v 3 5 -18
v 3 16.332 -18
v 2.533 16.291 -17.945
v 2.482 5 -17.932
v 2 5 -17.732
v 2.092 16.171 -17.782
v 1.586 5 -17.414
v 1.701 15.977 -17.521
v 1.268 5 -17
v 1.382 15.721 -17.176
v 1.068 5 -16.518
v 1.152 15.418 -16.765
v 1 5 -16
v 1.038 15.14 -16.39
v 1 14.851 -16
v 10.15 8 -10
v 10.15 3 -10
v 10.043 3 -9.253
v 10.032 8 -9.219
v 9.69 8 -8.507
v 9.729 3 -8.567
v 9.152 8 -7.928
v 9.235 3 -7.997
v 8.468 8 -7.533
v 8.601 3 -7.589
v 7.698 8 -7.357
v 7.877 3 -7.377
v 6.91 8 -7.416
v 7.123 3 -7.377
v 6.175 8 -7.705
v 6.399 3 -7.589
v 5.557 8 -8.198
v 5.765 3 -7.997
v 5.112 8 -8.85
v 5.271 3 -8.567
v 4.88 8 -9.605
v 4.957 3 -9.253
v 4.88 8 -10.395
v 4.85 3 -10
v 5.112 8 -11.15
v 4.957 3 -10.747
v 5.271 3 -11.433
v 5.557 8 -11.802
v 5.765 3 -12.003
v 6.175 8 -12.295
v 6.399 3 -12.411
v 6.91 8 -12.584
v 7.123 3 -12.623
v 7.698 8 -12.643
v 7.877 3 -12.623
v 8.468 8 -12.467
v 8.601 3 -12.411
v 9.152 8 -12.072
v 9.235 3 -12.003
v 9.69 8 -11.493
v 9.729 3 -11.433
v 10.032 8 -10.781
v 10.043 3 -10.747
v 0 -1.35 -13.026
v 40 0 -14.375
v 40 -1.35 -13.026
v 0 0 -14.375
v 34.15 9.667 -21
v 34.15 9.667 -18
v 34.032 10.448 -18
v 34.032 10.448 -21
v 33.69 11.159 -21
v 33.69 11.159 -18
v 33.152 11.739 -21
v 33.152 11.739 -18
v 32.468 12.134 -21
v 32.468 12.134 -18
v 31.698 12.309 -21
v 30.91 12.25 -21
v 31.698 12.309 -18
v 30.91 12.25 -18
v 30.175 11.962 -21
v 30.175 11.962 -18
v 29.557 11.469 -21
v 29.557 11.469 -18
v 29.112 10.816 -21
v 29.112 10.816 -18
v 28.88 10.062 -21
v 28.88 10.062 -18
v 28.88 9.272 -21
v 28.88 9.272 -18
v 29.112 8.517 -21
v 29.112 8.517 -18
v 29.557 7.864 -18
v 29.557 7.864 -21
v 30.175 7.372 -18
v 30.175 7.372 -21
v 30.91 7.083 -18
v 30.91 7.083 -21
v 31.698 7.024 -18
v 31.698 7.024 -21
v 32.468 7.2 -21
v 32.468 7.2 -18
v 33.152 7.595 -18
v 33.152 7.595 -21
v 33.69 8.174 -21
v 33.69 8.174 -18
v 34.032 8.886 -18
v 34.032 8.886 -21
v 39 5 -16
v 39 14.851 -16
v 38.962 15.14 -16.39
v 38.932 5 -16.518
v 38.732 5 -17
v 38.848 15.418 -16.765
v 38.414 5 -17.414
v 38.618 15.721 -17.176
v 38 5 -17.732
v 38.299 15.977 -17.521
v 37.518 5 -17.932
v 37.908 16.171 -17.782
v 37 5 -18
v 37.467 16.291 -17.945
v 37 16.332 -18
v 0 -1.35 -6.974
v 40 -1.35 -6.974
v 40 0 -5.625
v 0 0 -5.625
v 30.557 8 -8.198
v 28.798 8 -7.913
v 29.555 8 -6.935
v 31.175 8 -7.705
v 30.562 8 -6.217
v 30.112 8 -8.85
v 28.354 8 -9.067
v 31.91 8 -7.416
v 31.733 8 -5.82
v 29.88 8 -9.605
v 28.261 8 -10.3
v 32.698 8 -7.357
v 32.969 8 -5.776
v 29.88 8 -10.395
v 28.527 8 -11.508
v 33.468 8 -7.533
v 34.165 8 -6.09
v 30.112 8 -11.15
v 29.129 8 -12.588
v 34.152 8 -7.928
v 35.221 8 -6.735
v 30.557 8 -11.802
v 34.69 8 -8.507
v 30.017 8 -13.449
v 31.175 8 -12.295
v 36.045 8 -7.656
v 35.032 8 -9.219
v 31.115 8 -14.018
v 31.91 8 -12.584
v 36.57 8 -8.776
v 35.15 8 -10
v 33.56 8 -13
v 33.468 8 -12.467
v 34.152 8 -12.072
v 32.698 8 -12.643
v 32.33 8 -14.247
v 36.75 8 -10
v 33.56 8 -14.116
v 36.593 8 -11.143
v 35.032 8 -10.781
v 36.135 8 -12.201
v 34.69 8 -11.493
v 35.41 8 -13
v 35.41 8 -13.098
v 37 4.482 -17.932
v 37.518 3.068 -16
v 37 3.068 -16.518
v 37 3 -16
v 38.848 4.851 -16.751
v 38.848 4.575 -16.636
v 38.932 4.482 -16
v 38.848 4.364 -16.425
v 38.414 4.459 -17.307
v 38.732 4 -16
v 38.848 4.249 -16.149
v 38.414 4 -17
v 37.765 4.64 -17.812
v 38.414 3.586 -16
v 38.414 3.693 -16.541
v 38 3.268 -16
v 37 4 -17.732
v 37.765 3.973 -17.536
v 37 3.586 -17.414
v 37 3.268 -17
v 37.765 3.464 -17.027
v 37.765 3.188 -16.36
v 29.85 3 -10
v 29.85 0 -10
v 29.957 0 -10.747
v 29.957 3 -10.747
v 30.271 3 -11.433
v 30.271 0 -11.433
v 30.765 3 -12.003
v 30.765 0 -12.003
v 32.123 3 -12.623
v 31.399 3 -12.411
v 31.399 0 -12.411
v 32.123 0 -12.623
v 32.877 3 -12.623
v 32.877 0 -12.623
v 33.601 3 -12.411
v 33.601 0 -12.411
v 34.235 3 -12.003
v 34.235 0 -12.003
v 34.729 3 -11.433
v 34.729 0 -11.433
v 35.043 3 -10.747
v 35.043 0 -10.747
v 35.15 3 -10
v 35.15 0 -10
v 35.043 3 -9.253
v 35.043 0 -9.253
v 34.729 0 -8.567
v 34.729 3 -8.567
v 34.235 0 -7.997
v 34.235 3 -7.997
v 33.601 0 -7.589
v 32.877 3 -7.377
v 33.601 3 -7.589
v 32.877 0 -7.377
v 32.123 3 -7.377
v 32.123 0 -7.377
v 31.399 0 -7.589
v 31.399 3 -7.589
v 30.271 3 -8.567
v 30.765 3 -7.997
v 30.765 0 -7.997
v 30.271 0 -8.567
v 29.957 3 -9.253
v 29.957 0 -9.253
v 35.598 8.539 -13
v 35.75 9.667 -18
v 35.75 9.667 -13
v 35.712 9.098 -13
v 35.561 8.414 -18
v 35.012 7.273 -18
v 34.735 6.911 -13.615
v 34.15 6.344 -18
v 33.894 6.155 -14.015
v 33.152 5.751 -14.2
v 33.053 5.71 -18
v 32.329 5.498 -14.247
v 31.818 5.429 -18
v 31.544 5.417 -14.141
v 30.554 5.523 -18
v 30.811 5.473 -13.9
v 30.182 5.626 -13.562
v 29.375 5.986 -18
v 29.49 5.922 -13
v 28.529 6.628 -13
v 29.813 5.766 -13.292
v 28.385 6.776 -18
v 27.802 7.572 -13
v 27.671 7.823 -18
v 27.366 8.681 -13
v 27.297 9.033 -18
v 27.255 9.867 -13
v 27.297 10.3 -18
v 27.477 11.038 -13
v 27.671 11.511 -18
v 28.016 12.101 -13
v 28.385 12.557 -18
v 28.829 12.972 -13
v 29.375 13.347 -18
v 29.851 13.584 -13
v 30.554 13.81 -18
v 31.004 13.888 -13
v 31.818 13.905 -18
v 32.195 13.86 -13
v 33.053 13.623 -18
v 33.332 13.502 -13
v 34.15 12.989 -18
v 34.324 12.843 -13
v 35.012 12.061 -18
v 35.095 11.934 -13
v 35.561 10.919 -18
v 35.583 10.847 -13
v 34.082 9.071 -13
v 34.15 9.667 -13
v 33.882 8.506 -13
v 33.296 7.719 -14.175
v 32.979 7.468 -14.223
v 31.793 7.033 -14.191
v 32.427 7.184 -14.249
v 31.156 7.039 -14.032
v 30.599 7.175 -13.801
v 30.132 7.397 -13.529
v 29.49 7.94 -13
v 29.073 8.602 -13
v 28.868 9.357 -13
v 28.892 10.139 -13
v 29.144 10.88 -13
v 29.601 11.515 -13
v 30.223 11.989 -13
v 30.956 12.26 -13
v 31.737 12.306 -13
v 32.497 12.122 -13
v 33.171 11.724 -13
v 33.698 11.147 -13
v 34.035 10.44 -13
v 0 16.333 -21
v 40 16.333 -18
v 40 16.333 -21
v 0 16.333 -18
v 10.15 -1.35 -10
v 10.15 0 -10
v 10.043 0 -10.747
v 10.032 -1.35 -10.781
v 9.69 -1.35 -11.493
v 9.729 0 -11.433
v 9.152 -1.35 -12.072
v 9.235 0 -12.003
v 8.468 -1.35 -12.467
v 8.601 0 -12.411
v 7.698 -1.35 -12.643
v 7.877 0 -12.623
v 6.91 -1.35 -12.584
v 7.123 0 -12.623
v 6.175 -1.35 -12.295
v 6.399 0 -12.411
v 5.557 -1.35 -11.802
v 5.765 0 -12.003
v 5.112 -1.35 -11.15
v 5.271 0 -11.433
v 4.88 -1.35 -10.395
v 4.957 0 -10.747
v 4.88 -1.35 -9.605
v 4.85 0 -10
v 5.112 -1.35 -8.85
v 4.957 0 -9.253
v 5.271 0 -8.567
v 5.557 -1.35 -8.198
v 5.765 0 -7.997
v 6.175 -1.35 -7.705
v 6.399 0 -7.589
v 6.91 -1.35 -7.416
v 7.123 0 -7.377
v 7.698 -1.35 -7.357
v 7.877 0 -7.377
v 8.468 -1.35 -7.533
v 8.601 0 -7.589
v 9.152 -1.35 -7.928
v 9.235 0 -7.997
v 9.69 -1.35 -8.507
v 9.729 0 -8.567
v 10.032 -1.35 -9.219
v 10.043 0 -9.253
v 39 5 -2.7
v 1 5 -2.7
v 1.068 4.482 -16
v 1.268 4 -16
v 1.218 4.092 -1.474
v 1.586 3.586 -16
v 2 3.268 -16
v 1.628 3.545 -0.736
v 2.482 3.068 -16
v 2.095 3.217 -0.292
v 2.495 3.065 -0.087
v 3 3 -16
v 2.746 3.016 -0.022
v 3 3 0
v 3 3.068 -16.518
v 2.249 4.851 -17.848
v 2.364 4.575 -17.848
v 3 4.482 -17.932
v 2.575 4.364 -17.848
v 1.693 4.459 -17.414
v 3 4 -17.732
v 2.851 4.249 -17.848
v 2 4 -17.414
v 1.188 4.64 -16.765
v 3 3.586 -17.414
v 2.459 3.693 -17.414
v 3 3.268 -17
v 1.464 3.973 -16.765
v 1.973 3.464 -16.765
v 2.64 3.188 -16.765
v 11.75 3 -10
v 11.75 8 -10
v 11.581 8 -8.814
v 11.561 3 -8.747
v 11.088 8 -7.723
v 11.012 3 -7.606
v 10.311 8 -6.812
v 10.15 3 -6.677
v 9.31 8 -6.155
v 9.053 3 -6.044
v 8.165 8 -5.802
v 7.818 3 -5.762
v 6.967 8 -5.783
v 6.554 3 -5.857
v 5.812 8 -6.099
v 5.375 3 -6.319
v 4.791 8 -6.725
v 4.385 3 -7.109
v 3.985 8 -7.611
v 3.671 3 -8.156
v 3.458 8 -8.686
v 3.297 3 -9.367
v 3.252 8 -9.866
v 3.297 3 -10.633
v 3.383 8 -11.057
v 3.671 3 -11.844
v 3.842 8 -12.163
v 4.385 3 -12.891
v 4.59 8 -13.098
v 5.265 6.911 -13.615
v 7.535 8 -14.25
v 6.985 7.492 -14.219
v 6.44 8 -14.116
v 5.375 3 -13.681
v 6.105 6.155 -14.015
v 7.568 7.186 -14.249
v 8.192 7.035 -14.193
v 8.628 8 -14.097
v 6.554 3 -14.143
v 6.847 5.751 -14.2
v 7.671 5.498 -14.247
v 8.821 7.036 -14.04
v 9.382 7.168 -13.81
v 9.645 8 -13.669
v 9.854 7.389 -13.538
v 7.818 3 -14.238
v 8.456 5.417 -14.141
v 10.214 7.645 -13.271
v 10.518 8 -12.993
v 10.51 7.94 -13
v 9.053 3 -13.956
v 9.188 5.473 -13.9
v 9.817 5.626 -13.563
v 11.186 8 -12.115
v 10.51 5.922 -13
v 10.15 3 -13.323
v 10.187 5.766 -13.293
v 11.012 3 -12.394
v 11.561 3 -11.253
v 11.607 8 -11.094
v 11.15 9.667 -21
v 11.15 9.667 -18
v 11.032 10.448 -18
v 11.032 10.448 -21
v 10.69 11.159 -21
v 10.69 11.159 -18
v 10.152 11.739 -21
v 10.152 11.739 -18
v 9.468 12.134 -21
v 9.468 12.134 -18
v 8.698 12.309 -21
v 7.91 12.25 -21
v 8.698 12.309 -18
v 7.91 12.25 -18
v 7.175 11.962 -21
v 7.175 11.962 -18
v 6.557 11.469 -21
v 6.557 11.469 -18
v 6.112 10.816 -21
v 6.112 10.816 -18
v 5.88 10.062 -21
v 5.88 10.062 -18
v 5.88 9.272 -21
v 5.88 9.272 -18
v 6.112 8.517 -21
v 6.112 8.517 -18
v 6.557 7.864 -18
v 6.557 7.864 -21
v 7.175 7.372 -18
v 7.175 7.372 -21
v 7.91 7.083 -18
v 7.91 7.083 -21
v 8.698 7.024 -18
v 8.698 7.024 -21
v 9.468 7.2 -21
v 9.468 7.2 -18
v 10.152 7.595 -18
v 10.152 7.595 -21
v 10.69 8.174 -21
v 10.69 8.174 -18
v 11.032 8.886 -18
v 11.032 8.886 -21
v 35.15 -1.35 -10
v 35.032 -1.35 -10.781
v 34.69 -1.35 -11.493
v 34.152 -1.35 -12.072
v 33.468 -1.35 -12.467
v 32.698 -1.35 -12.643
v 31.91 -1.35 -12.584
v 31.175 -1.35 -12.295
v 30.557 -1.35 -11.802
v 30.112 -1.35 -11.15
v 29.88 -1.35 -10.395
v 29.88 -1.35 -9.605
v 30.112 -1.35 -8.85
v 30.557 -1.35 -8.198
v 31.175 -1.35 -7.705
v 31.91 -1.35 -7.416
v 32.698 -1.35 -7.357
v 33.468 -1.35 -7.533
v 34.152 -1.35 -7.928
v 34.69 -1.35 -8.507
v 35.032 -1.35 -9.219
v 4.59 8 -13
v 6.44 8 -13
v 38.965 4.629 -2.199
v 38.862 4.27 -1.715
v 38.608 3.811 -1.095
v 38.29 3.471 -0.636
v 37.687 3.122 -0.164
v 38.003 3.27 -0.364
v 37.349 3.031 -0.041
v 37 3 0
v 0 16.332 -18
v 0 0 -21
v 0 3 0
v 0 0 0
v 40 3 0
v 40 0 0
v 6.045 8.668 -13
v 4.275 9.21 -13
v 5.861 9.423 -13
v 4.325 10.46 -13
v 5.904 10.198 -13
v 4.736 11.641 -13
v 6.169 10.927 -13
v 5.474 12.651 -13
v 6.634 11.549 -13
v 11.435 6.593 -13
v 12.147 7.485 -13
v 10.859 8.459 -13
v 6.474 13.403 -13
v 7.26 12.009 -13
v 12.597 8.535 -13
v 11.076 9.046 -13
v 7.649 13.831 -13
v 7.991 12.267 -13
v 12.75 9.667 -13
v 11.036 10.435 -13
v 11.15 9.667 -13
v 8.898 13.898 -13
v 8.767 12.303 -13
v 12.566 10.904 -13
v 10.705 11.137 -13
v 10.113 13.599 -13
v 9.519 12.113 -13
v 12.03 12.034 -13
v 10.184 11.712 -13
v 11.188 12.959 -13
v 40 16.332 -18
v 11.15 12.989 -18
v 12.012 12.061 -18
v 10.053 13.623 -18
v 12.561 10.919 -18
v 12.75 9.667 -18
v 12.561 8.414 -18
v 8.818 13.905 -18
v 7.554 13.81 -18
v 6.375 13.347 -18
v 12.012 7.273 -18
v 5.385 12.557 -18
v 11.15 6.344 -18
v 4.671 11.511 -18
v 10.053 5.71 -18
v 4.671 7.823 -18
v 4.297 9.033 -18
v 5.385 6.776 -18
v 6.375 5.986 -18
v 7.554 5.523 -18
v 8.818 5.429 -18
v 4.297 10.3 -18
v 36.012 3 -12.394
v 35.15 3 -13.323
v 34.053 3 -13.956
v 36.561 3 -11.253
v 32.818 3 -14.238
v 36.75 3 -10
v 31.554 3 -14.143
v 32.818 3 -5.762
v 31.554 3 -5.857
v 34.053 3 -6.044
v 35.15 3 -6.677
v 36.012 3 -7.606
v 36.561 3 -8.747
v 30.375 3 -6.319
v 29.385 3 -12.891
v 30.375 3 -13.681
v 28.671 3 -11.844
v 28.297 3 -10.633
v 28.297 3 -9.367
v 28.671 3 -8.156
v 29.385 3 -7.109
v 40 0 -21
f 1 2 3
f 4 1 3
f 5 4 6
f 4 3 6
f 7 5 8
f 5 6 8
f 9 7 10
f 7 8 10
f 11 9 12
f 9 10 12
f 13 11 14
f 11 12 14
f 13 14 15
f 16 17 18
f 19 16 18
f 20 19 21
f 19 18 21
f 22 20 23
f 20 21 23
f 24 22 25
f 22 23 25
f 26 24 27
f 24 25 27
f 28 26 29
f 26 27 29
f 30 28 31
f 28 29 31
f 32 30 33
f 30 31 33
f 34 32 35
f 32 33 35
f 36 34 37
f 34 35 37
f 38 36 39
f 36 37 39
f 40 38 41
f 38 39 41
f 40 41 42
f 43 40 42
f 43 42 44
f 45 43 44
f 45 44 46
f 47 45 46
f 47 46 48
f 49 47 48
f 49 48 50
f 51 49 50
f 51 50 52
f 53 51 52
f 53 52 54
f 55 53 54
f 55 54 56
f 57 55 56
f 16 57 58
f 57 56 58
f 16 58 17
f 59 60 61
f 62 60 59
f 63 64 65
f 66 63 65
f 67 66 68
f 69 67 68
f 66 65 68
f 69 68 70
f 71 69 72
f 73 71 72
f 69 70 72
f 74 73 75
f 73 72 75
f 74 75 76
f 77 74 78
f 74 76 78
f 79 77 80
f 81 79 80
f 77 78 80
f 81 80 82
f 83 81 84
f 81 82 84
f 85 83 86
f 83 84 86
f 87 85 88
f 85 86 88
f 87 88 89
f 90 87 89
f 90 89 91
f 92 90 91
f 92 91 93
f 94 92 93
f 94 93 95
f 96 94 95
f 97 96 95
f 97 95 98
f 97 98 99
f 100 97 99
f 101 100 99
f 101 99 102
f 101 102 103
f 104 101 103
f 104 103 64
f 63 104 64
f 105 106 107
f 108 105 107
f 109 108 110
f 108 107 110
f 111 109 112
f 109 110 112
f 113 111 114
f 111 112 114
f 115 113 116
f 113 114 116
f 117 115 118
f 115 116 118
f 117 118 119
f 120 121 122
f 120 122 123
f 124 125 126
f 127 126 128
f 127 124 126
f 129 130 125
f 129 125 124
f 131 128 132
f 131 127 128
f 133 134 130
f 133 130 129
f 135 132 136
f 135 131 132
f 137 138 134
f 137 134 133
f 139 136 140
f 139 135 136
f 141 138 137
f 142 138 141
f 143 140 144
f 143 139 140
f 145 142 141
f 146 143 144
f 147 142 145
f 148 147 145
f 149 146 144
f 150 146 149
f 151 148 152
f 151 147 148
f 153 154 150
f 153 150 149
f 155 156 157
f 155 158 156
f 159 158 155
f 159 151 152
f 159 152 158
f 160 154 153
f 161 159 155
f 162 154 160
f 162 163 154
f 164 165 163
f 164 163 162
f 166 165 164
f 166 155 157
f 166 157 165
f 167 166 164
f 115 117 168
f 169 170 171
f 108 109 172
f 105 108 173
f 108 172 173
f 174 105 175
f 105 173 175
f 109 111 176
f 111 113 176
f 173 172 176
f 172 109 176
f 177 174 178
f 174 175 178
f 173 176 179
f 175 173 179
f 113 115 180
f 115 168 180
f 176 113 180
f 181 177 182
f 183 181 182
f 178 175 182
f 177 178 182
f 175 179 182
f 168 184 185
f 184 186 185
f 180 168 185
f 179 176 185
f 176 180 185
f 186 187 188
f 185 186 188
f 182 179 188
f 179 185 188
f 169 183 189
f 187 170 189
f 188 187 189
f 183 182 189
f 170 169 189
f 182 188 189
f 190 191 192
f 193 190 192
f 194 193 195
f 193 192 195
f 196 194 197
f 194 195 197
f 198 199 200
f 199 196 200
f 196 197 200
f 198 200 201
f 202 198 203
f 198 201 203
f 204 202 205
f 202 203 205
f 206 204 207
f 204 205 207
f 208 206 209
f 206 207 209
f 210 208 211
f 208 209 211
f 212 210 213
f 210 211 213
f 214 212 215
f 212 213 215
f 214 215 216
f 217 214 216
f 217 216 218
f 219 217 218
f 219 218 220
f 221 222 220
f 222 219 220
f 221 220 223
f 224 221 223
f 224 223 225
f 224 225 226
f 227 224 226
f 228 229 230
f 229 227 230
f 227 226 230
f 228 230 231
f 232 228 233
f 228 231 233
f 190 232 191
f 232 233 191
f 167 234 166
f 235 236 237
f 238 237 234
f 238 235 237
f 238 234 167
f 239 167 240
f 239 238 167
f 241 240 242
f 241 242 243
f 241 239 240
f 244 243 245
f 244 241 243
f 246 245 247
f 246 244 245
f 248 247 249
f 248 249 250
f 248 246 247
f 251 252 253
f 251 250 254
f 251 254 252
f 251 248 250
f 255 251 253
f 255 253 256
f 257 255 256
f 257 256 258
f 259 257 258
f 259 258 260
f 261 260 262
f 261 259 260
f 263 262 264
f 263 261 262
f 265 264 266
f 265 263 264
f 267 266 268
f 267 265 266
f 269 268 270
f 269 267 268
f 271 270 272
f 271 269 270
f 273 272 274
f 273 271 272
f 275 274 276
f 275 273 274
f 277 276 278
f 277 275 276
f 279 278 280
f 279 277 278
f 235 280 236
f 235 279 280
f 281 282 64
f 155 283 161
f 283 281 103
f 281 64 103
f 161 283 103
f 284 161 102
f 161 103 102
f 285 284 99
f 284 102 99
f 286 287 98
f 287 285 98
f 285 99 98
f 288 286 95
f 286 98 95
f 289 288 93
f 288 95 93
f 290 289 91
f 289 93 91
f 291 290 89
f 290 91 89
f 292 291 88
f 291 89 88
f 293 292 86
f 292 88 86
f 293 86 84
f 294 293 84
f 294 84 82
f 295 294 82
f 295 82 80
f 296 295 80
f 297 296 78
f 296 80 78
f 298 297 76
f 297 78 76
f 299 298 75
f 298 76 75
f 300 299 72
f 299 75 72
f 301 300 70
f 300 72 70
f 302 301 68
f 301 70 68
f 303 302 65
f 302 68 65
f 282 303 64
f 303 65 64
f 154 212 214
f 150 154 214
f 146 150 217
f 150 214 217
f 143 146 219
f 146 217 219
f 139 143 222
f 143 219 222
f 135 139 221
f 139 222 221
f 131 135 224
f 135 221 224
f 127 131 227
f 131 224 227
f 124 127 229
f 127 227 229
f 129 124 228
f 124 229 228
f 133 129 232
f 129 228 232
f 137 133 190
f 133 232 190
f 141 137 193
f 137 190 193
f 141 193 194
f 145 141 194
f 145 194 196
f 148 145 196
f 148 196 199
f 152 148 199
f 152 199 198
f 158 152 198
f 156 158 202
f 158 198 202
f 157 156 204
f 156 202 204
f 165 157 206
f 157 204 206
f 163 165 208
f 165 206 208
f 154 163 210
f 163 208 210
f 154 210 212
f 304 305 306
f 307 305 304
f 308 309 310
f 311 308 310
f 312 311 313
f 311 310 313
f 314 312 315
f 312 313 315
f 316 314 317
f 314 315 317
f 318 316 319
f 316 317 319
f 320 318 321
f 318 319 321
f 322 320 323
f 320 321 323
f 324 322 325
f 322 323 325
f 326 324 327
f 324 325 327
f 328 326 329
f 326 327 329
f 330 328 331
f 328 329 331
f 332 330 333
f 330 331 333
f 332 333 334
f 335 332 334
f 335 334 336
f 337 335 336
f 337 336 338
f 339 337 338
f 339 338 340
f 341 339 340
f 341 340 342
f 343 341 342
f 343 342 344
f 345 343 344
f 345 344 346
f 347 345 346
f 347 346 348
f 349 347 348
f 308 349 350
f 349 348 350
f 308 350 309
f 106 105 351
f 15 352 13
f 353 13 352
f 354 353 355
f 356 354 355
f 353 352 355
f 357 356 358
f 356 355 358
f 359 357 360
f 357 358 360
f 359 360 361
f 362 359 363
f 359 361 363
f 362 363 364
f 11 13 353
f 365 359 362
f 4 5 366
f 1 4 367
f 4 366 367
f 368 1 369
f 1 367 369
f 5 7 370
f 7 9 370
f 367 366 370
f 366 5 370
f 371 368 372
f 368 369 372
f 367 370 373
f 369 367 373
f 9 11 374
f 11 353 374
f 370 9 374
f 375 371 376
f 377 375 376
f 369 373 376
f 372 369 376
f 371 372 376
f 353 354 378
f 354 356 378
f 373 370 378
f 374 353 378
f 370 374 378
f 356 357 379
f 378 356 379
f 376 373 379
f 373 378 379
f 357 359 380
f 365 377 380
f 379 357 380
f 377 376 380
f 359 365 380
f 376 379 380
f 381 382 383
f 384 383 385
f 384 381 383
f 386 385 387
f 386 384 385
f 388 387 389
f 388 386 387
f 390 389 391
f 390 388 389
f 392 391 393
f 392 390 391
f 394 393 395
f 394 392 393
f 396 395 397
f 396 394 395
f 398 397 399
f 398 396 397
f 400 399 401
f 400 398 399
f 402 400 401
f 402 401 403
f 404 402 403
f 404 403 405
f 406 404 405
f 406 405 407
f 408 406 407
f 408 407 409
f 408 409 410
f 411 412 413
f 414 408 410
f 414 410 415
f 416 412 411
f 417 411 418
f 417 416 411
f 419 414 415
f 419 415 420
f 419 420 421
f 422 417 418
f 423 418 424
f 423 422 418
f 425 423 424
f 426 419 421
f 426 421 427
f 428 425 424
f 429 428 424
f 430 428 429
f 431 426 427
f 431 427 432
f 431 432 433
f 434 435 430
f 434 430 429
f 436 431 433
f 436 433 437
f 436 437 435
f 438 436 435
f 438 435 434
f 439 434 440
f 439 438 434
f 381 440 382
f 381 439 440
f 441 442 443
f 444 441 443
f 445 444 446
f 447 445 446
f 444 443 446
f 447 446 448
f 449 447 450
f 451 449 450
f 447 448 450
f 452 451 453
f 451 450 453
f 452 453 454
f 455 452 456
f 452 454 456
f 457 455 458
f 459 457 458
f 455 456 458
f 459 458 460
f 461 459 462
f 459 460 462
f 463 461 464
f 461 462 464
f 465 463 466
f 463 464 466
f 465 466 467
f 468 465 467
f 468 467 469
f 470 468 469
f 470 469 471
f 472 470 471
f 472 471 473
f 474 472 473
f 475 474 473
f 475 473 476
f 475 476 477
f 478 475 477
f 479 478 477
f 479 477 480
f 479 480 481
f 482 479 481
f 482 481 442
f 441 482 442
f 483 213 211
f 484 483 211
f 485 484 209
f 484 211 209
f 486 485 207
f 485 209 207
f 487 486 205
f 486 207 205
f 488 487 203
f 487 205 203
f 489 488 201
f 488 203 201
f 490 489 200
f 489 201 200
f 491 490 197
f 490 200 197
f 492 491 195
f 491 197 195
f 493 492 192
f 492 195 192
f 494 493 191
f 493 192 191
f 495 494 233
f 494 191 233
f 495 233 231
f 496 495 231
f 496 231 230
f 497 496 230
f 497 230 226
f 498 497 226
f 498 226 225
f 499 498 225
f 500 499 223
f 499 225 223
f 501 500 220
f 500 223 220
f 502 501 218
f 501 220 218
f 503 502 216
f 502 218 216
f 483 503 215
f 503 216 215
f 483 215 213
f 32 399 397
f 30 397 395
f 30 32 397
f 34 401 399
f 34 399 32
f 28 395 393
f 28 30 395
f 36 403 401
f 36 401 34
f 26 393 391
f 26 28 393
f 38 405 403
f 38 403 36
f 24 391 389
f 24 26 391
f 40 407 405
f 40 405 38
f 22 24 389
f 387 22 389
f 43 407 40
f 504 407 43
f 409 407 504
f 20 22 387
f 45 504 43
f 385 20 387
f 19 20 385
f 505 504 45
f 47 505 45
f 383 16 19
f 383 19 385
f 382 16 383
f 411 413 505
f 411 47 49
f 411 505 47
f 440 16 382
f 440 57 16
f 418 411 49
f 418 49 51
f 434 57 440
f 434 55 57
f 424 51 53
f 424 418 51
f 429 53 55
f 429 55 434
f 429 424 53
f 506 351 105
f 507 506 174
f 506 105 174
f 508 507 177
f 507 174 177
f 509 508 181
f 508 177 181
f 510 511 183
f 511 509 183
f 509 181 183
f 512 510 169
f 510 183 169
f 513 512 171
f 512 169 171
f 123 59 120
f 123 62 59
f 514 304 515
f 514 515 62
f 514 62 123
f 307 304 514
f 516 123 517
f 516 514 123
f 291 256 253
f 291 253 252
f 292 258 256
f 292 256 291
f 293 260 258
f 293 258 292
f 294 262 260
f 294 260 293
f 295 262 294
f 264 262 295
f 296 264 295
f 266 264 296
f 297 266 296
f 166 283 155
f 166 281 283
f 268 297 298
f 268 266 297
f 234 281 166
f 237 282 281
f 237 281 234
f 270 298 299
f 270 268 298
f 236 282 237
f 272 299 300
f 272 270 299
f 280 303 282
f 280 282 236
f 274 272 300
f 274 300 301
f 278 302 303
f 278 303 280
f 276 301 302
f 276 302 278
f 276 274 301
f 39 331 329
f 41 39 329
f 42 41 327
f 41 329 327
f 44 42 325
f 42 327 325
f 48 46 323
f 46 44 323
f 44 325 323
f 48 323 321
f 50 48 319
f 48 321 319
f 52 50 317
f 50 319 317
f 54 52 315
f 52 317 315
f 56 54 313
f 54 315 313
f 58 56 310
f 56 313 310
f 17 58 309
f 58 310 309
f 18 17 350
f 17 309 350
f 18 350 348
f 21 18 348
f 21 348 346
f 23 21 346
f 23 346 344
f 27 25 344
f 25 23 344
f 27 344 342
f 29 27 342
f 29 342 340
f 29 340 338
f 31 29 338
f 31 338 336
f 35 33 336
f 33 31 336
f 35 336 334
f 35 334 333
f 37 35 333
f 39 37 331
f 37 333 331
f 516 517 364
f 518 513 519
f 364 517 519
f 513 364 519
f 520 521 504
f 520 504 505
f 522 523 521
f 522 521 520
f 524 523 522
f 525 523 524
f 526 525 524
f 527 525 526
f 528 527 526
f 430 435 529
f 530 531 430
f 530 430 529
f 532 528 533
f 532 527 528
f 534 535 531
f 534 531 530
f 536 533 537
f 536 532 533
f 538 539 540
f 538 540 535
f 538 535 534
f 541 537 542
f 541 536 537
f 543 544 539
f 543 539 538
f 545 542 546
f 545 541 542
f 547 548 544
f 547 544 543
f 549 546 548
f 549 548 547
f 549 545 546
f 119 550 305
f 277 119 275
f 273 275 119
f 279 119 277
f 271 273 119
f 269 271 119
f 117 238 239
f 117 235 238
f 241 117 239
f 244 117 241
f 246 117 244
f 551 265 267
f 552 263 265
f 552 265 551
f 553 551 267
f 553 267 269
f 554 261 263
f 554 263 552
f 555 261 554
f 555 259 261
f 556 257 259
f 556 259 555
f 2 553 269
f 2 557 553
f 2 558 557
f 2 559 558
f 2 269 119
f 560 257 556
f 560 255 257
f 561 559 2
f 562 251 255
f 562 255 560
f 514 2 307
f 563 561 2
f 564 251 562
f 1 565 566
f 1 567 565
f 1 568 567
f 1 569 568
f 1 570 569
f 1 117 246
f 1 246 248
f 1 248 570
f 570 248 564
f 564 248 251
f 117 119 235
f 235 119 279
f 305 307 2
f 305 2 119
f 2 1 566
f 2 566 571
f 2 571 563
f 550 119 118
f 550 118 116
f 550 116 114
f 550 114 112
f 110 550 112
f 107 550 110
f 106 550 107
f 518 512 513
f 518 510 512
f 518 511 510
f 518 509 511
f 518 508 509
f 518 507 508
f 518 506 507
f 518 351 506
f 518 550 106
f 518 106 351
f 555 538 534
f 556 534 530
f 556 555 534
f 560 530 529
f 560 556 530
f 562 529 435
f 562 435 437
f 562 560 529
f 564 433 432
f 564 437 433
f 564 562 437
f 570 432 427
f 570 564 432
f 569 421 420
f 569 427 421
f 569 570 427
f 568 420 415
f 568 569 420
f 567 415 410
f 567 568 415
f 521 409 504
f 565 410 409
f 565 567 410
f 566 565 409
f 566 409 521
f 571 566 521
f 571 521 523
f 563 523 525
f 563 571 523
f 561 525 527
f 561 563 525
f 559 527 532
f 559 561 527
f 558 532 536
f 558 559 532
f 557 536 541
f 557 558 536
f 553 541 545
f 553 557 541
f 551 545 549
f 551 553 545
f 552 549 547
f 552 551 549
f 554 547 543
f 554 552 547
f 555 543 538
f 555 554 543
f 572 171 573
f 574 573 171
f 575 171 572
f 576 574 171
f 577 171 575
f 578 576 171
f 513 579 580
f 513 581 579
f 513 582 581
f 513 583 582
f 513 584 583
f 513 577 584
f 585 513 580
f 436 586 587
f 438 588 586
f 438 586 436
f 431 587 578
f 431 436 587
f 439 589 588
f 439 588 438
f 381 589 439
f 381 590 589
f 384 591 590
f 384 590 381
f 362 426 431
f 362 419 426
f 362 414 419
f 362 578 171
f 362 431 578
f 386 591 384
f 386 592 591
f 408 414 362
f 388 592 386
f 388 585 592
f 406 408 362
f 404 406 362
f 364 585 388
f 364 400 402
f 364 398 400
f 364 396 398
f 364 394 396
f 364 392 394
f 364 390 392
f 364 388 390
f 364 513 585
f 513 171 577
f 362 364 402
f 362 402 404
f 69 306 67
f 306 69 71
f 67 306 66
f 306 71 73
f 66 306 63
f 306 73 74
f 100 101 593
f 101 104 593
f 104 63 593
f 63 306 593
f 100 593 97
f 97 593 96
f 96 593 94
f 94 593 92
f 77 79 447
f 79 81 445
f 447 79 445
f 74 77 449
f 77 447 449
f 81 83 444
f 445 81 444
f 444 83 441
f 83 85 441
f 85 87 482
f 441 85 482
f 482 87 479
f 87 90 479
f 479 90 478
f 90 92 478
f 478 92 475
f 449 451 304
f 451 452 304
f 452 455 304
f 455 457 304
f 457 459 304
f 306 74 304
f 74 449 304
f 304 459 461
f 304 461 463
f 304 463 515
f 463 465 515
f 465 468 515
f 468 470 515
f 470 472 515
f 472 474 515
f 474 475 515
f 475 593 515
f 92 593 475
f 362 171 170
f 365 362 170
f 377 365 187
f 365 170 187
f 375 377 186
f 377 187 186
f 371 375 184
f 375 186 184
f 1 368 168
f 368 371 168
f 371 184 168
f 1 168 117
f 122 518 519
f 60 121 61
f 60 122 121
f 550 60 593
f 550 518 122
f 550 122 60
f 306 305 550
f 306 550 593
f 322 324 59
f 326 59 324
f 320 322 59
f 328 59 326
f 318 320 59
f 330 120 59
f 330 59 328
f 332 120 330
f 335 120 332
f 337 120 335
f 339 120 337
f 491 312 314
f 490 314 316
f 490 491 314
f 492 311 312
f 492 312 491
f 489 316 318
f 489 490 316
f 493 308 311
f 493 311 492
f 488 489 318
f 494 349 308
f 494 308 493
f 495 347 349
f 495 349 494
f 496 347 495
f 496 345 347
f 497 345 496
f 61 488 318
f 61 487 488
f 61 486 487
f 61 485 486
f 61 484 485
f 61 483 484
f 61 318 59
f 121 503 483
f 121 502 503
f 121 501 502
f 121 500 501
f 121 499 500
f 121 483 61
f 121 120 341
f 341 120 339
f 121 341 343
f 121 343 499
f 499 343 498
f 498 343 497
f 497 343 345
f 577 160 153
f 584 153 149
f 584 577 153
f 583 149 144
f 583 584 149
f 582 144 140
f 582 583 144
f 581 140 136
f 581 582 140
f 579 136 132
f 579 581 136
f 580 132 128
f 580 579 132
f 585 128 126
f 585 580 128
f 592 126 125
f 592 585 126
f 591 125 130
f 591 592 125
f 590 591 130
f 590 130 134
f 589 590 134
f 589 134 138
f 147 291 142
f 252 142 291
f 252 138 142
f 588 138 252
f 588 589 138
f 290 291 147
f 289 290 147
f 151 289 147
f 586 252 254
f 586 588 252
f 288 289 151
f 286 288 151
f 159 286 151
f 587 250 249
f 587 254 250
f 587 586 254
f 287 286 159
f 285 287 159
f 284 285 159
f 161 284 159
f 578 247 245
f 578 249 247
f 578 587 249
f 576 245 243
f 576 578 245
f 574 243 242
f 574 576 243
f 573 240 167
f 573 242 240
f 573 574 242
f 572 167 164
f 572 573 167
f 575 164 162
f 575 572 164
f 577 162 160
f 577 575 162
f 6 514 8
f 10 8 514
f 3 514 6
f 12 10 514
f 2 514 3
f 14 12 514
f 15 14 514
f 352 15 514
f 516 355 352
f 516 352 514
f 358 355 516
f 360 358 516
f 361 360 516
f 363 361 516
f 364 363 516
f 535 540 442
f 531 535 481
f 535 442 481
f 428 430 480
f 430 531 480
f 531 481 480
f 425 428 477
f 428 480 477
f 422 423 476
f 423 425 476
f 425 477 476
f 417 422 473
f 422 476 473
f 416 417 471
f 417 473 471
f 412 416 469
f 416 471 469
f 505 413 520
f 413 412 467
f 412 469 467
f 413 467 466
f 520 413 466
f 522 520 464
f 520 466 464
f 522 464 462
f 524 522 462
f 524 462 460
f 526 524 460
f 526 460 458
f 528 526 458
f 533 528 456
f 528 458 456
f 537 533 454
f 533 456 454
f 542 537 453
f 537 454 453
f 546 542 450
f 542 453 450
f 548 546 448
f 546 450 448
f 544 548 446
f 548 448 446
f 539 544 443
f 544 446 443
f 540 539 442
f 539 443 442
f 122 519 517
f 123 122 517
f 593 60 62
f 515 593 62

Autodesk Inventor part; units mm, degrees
ref_plane "YZ Plane" through (0, 0, 0) normal (1, 0, 0) x (0, 1, 0)
sketch "Sketch1" plane through (0, 0, 0) normal (0, 1, 0) x (-1, 0, 0)
  line L0 (0, 0) -> (-40, 0)
  line L1 (-40, 0) -> (-40, -21)
  line L2 (-40, -21) -> (0, -21)
  line L3 (0, -21) -> (0, 0)
  circle A0 centre (-7.5, -10) radius 2.65
  circle A1 centre (-32.5, -10) radius 2.65
  line L4 (-7.5, -10) -> (-32.5, -10) construction
  line L5 (0, -21) -> (-40, -21)
  line L6 (-40, -21) -> (-40, -18)
  line L7 (-40, -18) -> (0, -18)
  line L8 (0, -18) -> (0, -21)
  line L9 (-40, -21) -> (-39, -21)
  line L10 (-39, -21) -> (-39, 0)
  line L11 (-39, 0) -> (-40, 0)
  line L12 (-40, 0) -> (-40, -21)
  line L13 (0, 0) -> (-1, 0)
  line L14 (-1, 0) -> (-1, -21)
  line L15 (-1, -21) -> (0, -21)
  line L16 (0, -21) -> (0, 0)
  line L17 (-32.5, -10) -> (-40, -10) construction
  line L18 (-7.5, -10) -> (0, -10) construction
  point P0 (-1, -18)
  point P1 (-39, -18)
  dimension "d0" = 40
  dimension "d1" = 21
  dimension "d3" = 5.3
  dimension "d4" = 3
  dimension "d9" = 1
  dimension "d10" = 1
  dimension "d23" = 11
  dimension "d24" = 25
extrude "Extrusion1" add sketch "Sketch1" along normal blind 3
extrude "Extrusion2" add sketch "Sketch1" along normal blind 16.3333 contours L3 L2 L14 L7 | L14 L2 L10 L7 | L10 L2 L1 L7
ref_plane "Work Plane1" through (0, 3, 0) normal (0, 0.8036, 0.5952) x (1, 0, 0)
extrude "Extrusion3" add sketch "Sketch1" along normal up to surface contours L3 L7 L14 L0 | L10 L7 L1 L0 surface through (0, 3, 0) normal (0, 0.8036, 0.5952)
sketch "Sketch3" plane through (1, 3, -18) normal (0, 0, 1) x (1, 0, 0)
  line L0 (0, 13.3333) -> (0, 0) projected
  line L1 (0, 13.3333) -> (0, 0) projected
  line L2 (38, 0) -> (0, 0) projected
  line L3 (38, 0) -> (38, 13.3333) projected
  line L4 (0, 13.3333) -> (38, 13.3333) projected
  line L5 (0, 6.6667) -> (7.5, 6.6667) construction
  line L6 (7.5, 6.6667) -> (30.5, 6.6667) construction
  line L7 (30.5, 6.6667) -> (38, 6.6667) construction
  circle A0 centre (7.5, 6.6667) radius 2.65
  circle A1 centre (30.5, 6.6667) radius 2.65
  point P0 (-1, -3)
  dimension "d13" = 7.5
  dimension "d14" = 5.3
extrude "Extrusion4" cut sketch "Sketch3" against normal through all contours A0 | A1
ref_plane "Work Plane2" through (20, 0, -21) normal (-1, 0, 0) x (0, 0, 1)
sketch "Sketch5" plane through (0, 0, 0) normal (0, -1, 0) x (1, 0, 0)
  line L0 (0, -5.625) -> (40, -5.625)
  line L1 (40, -5.625) -> (40, -14.375)
  line L2 (40, -14.375) -> (0, -14.375)
  line L3 (0, -14.375) -> (0, -5.625)
  line L4 (0, -21) -> (0, 0) projected
  line L5 (40, 0) -> (40, -21) projected
  line L6 (0, -10) -> (40, -10) construction
  circle A0 centre (7.5, -10) radius 2.65 projected
  circle A1 centre (32.5, -10) radius 2.65 projected
  dimension "d17" = 8.75
extrude "Extrusion5" add sketch "Sketch5" along normal blind 1.35
chamfer "Chamfer1" distance 1.35 angle 45 2 edges at (20, -1.35, -5.625) (20, -1.35, -14.375)
fillet "Fillet1" radius 2 5 edges at (1, 3, -9) (1, 9.6667, -18) (20, 3, -18) (39, 9.6667, -18) (39, 3, -9)
sketch "Sketch6" plane through (3, 5, -18) normal (0, 0, 1) x (1, 0, 0)
  circle A0 centre (28.5, 4.6667) radius 2.65 projected
  circle A1 centre (5.5, 4.6667) radius 2.65 projected
  circle A2 centre (5.5, 4.6667) radius 4.25
  circle A3 centre (28.5, 4.6667) radius 4.25
  point P0 (-3, -5)
  dimension "d26" = 8.5
  dimension "d27" = 8.5
extrude "Extrusion6" add sketch "Sketch6" along normal blind 5
sketch "Sketch7" plane through (0, 3, 0) normal (0, 1, 0) x (1, 0, 0)
  circle A0 centre (7.5, 10) radius 2.65 projected
  circle A1 centre (32.5, 10) radius 2.65 projected
  circle A2 centre (7.5, 10) radius 4.25
  circle A3 centre (32.5, 10) radius 4.25
  point P0 (0, 0)
  dimension "d30" = 8.5
  dimension "d31" = 8.5
extrude "Extrusion7" add sketch "Sketch7" along normal blind 5
properties part number "Soporte Cajas" material "Rubber, Silicone"
